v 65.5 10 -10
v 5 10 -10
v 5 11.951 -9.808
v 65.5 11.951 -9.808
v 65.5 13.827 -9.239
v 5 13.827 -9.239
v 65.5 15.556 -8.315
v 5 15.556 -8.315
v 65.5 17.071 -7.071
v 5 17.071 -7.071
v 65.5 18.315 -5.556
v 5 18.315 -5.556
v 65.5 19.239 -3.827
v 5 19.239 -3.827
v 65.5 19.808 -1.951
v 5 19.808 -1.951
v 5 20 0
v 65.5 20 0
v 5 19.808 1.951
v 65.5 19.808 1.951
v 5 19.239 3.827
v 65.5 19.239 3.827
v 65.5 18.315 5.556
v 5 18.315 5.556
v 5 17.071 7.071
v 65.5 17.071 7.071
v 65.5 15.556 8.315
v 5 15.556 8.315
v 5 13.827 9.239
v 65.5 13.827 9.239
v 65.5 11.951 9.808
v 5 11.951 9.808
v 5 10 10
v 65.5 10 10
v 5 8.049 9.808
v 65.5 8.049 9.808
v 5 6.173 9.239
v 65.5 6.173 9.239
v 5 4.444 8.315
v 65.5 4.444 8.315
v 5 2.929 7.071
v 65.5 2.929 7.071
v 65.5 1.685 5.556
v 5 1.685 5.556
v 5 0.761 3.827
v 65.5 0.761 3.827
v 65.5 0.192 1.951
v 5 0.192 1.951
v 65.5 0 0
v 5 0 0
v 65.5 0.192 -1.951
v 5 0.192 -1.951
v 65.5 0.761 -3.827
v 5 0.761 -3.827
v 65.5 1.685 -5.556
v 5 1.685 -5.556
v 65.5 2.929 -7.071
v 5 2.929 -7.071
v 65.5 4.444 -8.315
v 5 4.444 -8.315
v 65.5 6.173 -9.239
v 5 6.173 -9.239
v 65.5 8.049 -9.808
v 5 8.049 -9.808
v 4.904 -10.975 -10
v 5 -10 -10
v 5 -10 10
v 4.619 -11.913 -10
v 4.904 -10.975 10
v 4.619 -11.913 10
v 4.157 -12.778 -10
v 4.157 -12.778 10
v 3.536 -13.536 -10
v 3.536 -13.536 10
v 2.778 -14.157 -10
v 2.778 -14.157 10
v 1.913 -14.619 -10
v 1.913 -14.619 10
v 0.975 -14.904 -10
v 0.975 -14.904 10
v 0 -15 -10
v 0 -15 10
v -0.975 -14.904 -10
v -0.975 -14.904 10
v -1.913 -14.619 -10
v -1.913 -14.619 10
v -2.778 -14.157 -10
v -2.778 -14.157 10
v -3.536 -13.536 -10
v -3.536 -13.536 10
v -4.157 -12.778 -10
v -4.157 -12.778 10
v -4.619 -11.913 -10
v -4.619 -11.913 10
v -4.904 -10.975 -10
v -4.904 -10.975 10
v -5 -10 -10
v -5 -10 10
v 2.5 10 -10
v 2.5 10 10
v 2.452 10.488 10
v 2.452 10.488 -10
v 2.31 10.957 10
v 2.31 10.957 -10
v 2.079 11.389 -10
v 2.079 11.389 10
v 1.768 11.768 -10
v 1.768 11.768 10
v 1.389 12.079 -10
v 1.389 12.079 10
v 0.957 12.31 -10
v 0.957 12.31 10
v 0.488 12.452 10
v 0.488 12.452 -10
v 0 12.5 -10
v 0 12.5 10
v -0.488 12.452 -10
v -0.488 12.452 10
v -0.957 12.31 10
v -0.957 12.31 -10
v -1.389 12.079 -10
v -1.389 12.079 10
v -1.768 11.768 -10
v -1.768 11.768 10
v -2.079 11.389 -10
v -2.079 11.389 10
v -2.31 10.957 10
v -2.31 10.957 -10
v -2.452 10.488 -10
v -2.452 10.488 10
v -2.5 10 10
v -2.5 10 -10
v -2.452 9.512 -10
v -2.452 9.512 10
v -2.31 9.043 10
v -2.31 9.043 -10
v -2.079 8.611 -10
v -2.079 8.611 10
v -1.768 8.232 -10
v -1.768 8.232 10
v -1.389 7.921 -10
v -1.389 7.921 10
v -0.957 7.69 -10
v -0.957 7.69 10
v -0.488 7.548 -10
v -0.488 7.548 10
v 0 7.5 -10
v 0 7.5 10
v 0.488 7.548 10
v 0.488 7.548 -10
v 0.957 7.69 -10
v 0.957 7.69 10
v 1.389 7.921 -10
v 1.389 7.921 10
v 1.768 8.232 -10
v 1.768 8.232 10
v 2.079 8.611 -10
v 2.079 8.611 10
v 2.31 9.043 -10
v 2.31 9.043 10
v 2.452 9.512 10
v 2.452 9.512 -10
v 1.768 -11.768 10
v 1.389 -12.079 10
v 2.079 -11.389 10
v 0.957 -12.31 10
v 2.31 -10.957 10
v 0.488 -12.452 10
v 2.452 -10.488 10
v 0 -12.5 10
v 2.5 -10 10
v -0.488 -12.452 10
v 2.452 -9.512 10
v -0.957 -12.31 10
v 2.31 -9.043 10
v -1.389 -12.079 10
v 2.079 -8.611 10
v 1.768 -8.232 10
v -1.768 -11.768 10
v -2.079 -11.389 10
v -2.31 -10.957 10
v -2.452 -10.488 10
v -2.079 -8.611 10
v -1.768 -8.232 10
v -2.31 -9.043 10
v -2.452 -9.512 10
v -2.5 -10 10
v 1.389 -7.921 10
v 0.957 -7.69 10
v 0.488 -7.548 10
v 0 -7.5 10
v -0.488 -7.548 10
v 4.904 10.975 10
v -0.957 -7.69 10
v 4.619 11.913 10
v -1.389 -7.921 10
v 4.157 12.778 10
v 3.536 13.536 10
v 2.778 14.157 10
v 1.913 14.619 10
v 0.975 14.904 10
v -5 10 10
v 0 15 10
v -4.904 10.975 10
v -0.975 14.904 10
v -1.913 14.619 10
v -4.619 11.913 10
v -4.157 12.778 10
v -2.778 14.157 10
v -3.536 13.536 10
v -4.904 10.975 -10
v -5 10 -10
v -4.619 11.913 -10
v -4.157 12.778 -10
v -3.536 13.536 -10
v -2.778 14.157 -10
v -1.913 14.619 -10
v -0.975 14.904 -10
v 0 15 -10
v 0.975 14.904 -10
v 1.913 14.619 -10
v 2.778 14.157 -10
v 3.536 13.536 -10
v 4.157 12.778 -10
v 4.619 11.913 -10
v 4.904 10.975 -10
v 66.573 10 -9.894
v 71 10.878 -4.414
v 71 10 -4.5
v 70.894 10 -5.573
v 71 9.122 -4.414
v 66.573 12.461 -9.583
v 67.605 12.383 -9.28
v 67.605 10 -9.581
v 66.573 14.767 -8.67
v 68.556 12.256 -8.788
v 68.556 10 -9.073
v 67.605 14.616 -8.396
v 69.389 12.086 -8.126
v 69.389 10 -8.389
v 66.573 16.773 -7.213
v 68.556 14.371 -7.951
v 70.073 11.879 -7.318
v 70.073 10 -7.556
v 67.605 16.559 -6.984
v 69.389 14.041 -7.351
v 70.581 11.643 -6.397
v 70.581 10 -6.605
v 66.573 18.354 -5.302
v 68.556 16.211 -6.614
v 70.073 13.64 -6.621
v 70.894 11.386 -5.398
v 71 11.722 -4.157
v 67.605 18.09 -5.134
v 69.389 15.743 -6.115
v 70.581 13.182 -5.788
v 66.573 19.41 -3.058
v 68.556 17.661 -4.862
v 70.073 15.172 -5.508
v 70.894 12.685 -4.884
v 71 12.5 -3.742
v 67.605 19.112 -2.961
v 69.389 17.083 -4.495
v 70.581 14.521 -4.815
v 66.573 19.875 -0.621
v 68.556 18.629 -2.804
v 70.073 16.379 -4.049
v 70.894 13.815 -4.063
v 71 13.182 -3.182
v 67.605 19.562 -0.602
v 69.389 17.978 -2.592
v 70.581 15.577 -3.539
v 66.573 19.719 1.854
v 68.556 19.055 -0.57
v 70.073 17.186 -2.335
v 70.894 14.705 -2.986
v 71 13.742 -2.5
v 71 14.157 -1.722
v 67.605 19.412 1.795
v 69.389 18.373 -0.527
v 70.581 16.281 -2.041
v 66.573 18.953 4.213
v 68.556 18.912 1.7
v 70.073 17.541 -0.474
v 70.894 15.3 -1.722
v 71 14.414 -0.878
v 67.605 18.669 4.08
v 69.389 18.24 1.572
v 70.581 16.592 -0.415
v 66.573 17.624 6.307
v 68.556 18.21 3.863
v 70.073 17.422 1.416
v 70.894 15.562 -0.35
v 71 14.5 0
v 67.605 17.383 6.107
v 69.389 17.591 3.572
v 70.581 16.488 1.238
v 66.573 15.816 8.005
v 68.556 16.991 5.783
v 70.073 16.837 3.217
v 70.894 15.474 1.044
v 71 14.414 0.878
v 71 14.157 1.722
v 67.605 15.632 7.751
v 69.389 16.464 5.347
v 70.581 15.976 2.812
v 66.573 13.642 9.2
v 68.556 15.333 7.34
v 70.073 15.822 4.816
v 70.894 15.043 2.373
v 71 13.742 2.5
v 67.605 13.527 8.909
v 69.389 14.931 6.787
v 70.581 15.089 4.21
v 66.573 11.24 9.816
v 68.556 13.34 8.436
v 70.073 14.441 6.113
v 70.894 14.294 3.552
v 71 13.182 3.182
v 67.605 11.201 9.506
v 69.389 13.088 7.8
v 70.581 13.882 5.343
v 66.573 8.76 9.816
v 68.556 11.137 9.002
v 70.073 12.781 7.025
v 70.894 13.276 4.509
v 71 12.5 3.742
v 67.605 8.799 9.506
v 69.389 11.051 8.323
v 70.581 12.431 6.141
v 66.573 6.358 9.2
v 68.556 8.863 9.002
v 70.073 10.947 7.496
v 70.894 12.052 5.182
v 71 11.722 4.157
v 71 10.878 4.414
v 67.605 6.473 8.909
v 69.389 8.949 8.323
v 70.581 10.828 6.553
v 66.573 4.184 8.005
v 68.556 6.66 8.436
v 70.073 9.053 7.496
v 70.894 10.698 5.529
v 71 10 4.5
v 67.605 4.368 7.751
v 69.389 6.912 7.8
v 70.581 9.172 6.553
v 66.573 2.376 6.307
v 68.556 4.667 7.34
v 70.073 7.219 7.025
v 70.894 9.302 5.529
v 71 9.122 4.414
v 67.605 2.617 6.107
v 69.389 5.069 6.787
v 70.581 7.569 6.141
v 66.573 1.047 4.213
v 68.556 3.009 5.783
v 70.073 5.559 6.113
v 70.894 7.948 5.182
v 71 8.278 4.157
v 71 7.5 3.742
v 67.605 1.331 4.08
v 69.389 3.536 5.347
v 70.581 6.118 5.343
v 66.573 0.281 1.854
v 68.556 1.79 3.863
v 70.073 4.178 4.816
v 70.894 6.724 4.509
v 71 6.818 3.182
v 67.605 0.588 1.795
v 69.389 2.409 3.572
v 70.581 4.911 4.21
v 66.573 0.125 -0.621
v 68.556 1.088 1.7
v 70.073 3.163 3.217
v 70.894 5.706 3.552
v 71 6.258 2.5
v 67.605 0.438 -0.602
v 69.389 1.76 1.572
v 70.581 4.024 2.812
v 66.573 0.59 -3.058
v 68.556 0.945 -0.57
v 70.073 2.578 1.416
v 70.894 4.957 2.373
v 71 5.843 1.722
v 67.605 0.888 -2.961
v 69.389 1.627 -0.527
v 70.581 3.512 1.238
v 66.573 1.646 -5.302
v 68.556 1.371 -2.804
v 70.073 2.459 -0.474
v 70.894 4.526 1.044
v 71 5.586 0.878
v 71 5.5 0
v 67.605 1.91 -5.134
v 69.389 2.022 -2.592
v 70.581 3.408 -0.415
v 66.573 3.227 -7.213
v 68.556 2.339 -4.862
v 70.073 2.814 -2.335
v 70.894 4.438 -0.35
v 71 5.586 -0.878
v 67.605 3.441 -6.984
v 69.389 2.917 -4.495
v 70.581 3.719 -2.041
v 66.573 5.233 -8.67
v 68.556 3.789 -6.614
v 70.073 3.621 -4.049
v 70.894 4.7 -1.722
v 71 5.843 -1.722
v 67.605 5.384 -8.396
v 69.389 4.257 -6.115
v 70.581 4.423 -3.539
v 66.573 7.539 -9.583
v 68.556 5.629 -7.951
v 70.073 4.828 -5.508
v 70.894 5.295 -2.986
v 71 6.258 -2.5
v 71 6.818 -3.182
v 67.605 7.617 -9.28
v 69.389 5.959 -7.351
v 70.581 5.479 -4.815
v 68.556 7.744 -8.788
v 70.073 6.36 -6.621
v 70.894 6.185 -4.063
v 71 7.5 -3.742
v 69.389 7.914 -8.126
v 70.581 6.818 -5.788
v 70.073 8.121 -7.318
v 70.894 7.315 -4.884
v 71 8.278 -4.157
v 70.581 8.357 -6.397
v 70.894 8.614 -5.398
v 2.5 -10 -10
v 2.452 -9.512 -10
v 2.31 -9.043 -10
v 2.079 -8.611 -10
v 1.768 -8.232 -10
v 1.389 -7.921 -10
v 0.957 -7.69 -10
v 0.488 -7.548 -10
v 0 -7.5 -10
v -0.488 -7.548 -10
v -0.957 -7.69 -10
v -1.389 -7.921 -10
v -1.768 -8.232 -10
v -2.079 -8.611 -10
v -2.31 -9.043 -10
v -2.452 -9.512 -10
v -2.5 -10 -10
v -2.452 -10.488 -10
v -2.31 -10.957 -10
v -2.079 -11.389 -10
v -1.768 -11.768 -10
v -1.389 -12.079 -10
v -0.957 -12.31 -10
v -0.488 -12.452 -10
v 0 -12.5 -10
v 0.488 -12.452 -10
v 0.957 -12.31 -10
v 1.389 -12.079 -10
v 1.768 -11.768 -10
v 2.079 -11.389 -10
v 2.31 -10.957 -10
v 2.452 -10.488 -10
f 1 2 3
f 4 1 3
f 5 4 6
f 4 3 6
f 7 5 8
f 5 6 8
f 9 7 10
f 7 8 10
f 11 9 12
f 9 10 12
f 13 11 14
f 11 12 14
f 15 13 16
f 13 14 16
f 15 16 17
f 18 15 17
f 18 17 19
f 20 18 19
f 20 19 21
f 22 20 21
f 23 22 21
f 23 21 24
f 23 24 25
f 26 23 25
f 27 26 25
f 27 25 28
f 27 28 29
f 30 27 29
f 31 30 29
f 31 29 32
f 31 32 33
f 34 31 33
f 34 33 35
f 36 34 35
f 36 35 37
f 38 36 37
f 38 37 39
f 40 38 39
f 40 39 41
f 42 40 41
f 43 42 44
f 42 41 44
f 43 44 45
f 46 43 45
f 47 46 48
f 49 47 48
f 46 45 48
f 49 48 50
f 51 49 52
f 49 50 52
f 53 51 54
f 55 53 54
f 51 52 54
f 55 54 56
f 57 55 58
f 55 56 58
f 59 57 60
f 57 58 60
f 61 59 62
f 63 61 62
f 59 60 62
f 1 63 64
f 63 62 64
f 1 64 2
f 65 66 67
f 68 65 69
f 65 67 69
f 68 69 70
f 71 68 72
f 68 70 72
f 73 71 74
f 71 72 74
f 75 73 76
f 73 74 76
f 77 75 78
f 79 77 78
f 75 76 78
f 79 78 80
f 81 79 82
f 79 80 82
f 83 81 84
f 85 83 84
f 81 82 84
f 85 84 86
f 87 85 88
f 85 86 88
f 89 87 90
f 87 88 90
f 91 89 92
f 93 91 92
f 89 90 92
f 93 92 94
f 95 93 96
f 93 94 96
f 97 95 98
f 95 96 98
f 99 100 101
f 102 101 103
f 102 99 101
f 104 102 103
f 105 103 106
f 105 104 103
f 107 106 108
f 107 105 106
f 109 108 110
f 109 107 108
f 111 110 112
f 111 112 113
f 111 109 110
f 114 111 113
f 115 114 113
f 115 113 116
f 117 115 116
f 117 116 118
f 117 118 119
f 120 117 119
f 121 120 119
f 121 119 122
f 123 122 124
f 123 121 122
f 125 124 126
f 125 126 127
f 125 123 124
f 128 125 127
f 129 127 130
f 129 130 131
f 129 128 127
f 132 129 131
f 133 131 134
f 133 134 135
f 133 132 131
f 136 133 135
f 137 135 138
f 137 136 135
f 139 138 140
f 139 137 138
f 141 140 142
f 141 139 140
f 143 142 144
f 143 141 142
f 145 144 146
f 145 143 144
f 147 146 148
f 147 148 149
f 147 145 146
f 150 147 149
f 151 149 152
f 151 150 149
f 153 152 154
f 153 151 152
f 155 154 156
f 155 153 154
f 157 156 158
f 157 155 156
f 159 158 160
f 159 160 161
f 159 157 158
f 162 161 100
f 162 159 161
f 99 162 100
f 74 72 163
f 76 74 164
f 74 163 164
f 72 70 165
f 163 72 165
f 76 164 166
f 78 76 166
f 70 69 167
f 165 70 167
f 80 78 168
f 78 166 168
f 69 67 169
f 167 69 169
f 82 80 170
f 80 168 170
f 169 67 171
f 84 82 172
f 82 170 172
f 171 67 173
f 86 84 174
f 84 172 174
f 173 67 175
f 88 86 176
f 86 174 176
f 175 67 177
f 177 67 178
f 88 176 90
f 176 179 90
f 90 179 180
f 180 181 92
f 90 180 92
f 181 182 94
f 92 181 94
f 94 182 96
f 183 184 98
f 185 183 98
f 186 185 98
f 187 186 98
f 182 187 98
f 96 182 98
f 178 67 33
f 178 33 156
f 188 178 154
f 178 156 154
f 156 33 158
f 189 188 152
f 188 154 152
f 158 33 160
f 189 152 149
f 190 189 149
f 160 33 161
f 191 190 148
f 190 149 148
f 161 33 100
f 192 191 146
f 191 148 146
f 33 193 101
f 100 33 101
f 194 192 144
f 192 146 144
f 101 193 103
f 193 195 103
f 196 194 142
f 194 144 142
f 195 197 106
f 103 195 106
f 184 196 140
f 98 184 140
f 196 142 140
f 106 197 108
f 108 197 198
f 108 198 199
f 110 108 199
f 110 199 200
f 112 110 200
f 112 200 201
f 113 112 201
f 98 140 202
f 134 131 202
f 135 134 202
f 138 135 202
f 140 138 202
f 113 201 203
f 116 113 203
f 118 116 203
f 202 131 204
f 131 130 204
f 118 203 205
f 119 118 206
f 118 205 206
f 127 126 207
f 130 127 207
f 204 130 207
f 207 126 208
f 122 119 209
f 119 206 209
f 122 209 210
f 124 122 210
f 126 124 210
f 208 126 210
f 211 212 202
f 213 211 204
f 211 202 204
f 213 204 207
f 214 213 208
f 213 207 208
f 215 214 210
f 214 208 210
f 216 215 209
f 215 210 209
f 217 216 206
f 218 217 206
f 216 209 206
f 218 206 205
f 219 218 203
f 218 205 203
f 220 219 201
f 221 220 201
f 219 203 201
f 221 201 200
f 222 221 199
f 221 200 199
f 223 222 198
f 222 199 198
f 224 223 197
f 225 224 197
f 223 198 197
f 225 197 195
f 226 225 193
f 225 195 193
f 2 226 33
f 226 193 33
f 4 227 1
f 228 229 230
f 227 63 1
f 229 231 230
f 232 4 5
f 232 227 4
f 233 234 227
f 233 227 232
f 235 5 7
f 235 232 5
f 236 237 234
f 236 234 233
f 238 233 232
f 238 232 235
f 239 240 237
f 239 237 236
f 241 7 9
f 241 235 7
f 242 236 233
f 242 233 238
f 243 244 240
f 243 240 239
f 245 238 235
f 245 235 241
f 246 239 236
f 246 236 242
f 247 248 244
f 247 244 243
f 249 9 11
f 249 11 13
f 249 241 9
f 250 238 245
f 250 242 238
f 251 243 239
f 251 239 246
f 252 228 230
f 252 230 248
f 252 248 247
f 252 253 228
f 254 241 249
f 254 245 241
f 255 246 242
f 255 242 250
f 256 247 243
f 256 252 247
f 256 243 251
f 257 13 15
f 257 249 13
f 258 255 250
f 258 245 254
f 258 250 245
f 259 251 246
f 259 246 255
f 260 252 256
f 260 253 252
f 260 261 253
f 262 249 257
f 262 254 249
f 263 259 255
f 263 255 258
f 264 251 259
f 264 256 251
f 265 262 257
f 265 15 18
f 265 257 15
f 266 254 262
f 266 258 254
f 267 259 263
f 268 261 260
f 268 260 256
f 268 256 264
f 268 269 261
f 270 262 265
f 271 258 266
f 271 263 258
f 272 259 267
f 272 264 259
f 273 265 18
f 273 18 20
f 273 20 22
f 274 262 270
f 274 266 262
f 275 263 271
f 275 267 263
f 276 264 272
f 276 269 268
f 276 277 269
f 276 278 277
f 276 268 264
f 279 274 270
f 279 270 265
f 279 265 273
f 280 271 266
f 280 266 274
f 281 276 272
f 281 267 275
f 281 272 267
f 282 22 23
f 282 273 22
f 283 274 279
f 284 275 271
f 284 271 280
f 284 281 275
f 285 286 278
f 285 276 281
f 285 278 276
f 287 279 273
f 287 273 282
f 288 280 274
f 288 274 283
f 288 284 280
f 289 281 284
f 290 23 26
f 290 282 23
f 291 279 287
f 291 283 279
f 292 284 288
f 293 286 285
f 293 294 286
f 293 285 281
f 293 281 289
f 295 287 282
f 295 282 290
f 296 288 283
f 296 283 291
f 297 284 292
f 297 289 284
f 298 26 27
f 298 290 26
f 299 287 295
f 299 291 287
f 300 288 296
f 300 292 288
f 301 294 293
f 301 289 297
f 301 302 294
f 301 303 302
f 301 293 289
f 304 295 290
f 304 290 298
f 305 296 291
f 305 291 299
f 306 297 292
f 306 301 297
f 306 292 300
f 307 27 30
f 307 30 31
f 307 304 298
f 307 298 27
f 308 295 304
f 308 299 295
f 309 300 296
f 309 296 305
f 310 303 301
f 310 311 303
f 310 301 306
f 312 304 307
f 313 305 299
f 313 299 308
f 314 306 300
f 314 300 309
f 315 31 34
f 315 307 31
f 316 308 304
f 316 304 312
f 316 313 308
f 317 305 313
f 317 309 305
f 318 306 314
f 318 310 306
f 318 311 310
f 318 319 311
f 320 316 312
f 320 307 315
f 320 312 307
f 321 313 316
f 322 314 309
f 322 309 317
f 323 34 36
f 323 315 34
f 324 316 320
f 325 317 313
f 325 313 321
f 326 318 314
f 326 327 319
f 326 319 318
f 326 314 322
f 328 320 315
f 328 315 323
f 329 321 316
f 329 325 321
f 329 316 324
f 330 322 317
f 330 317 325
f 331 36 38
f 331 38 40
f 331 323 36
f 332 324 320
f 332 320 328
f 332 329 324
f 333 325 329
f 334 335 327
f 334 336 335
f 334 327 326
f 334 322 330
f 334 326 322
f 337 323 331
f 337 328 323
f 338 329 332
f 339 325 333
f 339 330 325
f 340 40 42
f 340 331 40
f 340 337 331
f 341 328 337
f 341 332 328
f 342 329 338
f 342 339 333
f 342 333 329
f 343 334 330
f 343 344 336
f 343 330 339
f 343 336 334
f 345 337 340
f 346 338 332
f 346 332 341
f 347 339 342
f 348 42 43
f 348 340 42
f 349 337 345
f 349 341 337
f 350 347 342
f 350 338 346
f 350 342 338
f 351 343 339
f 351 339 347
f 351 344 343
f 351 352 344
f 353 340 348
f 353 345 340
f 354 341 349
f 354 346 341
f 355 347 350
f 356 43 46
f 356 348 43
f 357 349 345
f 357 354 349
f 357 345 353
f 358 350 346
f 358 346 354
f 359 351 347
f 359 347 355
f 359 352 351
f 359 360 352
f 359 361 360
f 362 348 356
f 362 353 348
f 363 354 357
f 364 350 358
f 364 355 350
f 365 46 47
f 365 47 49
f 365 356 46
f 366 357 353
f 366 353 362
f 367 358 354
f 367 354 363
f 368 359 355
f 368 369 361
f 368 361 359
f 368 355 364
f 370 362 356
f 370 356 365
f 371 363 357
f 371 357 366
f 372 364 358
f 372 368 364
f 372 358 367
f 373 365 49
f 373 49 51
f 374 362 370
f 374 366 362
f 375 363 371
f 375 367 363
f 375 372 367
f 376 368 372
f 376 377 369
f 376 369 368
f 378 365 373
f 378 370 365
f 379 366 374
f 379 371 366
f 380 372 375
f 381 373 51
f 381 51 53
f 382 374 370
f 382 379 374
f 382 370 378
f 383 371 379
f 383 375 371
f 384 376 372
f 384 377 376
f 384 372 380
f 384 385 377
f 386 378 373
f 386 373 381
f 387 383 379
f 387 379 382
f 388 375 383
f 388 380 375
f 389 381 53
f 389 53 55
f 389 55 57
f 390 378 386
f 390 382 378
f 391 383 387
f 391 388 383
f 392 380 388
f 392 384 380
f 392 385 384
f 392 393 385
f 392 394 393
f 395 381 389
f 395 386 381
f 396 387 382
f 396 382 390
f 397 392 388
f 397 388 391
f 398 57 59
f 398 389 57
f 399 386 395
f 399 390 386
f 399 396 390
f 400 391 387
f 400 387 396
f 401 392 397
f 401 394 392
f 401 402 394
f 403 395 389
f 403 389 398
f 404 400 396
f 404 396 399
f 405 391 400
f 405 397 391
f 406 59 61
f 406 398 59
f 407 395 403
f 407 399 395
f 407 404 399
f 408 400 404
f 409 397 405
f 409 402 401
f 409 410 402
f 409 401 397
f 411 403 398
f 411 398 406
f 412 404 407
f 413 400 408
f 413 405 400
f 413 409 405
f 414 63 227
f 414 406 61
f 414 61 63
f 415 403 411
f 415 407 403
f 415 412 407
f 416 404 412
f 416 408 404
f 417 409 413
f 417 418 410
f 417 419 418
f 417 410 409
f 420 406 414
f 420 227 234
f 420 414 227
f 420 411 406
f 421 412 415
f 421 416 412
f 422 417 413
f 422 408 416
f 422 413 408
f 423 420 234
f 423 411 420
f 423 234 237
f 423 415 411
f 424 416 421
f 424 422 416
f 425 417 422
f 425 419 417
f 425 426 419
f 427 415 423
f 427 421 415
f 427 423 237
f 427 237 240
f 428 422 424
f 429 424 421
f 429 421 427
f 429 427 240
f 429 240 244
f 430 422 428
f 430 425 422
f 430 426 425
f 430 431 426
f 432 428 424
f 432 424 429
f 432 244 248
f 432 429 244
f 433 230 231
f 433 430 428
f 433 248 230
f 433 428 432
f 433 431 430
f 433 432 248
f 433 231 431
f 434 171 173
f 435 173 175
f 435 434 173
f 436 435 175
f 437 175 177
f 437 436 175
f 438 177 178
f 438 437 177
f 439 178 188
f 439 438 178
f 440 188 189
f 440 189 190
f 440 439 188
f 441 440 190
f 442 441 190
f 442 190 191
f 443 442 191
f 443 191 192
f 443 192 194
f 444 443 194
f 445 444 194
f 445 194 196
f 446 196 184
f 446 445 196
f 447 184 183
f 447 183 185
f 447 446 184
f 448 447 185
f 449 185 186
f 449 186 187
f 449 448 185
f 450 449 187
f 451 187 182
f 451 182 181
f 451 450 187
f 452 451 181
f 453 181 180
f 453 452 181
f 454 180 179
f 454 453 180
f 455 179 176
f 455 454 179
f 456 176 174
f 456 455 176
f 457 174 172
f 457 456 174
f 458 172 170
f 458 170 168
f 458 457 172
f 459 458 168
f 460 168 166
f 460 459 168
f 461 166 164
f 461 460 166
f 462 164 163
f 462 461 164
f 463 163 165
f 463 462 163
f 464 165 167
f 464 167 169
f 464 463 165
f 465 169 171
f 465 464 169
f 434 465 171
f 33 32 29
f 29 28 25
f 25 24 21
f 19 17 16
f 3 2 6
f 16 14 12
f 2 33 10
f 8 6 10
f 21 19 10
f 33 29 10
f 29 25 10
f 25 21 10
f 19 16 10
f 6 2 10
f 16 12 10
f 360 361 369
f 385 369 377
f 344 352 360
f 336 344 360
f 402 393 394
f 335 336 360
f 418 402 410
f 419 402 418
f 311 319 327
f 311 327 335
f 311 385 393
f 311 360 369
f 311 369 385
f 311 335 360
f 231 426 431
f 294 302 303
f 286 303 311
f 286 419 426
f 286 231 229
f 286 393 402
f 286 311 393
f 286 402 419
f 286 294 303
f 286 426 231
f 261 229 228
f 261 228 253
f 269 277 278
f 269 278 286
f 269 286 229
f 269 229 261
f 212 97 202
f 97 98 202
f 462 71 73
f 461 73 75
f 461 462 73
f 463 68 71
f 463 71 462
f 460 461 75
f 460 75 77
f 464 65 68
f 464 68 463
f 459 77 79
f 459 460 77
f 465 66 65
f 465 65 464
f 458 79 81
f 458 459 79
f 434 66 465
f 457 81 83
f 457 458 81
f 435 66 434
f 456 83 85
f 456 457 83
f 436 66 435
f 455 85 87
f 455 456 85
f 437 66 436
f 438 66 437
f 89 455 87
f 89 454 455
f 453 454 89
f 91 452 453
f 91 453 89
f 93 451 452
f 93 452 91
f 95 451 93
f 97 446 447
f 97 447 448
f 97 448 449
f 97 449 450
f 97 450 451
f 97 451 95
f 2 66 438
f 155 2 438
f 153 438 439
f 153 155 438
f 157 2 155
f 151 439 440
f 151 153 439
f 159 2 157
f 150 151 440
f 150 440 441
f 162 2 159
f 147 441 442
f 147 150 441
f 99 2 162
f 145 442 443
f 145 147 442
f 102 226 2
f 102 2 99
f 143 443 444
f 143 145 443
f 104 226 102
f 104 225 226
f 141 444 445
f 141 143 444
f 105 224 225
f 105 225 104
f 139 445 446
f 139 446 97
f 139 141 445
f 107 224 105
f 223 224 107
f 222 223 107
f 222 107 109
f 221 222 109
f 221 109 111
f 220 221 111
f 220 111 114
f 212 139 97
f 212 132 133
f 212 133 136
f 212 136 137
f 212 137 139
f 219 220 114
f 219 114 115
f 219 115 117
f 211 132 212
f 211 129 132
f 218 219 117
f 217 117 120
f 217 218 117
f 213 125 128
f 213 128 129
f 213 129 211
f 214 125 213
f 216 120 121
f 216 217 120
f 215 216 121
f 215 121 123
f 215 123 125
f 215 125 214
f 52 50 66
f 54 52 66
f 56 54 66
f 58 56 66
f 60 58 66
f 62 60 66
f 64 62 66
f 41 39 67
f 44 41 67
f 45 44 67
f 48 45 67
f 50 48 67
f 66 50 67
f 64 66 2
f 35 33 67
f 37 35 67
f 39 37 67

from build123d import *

# Parameters (mm, degrees)
ESQUISSE1_R        = 2.5
BOSS_EXTRU_1_DEPTH = 10
ESQUISSE2_R        = 10
BOSS_EXTRU_2_DEPTH = 66
CONG_1_R           = 5.5


with BuildPart() as part:
    # Esquisse1 → Boss.-Extru.1 (new, symmetric)
    with BuildSketch(Plane.XY):
        with BuildLine():
            Line((5, 10), (5, -10))
            ThreePointArc((5, -10), (0, -15), (-5, -10))
            Line((-5, -10), (-5, 10))
            ThreePointArc((-5, 10), (0, 15), (5, 10))
        make_face()
        with Locations((0, 10)):
            Circle(ESQUISSE1_R, mode=Mode.SUBTRACT)
        with Locations((0, -10)):
            Circle(ESQUISSE1_R, mode=Mode.SUBTRACT)
    extrude(amount=BOSS_EXTRU_1_DEPTH, both=True)

    # Esquisse2 → Boss.-Extru.2 (add)
    with BuildSketch(Plane(origin=(5, 0, 0), x_dir=(0, 0, -1), z_dir=(1, 0, 0))):
        with Locations((0, 10)):
            Circle(ESQUISSE2_R)
    extrude(amount=BOSS_EXTRU_2_DEPTH)

    # Congé1
    cong_1_edges = [part.edges().sort_by_distance(p)[0] for p in [
        (71, 10, 10),
    ]]
    fillet(cong_1_edges, radius=CONG_1_R)


solid = part.part
